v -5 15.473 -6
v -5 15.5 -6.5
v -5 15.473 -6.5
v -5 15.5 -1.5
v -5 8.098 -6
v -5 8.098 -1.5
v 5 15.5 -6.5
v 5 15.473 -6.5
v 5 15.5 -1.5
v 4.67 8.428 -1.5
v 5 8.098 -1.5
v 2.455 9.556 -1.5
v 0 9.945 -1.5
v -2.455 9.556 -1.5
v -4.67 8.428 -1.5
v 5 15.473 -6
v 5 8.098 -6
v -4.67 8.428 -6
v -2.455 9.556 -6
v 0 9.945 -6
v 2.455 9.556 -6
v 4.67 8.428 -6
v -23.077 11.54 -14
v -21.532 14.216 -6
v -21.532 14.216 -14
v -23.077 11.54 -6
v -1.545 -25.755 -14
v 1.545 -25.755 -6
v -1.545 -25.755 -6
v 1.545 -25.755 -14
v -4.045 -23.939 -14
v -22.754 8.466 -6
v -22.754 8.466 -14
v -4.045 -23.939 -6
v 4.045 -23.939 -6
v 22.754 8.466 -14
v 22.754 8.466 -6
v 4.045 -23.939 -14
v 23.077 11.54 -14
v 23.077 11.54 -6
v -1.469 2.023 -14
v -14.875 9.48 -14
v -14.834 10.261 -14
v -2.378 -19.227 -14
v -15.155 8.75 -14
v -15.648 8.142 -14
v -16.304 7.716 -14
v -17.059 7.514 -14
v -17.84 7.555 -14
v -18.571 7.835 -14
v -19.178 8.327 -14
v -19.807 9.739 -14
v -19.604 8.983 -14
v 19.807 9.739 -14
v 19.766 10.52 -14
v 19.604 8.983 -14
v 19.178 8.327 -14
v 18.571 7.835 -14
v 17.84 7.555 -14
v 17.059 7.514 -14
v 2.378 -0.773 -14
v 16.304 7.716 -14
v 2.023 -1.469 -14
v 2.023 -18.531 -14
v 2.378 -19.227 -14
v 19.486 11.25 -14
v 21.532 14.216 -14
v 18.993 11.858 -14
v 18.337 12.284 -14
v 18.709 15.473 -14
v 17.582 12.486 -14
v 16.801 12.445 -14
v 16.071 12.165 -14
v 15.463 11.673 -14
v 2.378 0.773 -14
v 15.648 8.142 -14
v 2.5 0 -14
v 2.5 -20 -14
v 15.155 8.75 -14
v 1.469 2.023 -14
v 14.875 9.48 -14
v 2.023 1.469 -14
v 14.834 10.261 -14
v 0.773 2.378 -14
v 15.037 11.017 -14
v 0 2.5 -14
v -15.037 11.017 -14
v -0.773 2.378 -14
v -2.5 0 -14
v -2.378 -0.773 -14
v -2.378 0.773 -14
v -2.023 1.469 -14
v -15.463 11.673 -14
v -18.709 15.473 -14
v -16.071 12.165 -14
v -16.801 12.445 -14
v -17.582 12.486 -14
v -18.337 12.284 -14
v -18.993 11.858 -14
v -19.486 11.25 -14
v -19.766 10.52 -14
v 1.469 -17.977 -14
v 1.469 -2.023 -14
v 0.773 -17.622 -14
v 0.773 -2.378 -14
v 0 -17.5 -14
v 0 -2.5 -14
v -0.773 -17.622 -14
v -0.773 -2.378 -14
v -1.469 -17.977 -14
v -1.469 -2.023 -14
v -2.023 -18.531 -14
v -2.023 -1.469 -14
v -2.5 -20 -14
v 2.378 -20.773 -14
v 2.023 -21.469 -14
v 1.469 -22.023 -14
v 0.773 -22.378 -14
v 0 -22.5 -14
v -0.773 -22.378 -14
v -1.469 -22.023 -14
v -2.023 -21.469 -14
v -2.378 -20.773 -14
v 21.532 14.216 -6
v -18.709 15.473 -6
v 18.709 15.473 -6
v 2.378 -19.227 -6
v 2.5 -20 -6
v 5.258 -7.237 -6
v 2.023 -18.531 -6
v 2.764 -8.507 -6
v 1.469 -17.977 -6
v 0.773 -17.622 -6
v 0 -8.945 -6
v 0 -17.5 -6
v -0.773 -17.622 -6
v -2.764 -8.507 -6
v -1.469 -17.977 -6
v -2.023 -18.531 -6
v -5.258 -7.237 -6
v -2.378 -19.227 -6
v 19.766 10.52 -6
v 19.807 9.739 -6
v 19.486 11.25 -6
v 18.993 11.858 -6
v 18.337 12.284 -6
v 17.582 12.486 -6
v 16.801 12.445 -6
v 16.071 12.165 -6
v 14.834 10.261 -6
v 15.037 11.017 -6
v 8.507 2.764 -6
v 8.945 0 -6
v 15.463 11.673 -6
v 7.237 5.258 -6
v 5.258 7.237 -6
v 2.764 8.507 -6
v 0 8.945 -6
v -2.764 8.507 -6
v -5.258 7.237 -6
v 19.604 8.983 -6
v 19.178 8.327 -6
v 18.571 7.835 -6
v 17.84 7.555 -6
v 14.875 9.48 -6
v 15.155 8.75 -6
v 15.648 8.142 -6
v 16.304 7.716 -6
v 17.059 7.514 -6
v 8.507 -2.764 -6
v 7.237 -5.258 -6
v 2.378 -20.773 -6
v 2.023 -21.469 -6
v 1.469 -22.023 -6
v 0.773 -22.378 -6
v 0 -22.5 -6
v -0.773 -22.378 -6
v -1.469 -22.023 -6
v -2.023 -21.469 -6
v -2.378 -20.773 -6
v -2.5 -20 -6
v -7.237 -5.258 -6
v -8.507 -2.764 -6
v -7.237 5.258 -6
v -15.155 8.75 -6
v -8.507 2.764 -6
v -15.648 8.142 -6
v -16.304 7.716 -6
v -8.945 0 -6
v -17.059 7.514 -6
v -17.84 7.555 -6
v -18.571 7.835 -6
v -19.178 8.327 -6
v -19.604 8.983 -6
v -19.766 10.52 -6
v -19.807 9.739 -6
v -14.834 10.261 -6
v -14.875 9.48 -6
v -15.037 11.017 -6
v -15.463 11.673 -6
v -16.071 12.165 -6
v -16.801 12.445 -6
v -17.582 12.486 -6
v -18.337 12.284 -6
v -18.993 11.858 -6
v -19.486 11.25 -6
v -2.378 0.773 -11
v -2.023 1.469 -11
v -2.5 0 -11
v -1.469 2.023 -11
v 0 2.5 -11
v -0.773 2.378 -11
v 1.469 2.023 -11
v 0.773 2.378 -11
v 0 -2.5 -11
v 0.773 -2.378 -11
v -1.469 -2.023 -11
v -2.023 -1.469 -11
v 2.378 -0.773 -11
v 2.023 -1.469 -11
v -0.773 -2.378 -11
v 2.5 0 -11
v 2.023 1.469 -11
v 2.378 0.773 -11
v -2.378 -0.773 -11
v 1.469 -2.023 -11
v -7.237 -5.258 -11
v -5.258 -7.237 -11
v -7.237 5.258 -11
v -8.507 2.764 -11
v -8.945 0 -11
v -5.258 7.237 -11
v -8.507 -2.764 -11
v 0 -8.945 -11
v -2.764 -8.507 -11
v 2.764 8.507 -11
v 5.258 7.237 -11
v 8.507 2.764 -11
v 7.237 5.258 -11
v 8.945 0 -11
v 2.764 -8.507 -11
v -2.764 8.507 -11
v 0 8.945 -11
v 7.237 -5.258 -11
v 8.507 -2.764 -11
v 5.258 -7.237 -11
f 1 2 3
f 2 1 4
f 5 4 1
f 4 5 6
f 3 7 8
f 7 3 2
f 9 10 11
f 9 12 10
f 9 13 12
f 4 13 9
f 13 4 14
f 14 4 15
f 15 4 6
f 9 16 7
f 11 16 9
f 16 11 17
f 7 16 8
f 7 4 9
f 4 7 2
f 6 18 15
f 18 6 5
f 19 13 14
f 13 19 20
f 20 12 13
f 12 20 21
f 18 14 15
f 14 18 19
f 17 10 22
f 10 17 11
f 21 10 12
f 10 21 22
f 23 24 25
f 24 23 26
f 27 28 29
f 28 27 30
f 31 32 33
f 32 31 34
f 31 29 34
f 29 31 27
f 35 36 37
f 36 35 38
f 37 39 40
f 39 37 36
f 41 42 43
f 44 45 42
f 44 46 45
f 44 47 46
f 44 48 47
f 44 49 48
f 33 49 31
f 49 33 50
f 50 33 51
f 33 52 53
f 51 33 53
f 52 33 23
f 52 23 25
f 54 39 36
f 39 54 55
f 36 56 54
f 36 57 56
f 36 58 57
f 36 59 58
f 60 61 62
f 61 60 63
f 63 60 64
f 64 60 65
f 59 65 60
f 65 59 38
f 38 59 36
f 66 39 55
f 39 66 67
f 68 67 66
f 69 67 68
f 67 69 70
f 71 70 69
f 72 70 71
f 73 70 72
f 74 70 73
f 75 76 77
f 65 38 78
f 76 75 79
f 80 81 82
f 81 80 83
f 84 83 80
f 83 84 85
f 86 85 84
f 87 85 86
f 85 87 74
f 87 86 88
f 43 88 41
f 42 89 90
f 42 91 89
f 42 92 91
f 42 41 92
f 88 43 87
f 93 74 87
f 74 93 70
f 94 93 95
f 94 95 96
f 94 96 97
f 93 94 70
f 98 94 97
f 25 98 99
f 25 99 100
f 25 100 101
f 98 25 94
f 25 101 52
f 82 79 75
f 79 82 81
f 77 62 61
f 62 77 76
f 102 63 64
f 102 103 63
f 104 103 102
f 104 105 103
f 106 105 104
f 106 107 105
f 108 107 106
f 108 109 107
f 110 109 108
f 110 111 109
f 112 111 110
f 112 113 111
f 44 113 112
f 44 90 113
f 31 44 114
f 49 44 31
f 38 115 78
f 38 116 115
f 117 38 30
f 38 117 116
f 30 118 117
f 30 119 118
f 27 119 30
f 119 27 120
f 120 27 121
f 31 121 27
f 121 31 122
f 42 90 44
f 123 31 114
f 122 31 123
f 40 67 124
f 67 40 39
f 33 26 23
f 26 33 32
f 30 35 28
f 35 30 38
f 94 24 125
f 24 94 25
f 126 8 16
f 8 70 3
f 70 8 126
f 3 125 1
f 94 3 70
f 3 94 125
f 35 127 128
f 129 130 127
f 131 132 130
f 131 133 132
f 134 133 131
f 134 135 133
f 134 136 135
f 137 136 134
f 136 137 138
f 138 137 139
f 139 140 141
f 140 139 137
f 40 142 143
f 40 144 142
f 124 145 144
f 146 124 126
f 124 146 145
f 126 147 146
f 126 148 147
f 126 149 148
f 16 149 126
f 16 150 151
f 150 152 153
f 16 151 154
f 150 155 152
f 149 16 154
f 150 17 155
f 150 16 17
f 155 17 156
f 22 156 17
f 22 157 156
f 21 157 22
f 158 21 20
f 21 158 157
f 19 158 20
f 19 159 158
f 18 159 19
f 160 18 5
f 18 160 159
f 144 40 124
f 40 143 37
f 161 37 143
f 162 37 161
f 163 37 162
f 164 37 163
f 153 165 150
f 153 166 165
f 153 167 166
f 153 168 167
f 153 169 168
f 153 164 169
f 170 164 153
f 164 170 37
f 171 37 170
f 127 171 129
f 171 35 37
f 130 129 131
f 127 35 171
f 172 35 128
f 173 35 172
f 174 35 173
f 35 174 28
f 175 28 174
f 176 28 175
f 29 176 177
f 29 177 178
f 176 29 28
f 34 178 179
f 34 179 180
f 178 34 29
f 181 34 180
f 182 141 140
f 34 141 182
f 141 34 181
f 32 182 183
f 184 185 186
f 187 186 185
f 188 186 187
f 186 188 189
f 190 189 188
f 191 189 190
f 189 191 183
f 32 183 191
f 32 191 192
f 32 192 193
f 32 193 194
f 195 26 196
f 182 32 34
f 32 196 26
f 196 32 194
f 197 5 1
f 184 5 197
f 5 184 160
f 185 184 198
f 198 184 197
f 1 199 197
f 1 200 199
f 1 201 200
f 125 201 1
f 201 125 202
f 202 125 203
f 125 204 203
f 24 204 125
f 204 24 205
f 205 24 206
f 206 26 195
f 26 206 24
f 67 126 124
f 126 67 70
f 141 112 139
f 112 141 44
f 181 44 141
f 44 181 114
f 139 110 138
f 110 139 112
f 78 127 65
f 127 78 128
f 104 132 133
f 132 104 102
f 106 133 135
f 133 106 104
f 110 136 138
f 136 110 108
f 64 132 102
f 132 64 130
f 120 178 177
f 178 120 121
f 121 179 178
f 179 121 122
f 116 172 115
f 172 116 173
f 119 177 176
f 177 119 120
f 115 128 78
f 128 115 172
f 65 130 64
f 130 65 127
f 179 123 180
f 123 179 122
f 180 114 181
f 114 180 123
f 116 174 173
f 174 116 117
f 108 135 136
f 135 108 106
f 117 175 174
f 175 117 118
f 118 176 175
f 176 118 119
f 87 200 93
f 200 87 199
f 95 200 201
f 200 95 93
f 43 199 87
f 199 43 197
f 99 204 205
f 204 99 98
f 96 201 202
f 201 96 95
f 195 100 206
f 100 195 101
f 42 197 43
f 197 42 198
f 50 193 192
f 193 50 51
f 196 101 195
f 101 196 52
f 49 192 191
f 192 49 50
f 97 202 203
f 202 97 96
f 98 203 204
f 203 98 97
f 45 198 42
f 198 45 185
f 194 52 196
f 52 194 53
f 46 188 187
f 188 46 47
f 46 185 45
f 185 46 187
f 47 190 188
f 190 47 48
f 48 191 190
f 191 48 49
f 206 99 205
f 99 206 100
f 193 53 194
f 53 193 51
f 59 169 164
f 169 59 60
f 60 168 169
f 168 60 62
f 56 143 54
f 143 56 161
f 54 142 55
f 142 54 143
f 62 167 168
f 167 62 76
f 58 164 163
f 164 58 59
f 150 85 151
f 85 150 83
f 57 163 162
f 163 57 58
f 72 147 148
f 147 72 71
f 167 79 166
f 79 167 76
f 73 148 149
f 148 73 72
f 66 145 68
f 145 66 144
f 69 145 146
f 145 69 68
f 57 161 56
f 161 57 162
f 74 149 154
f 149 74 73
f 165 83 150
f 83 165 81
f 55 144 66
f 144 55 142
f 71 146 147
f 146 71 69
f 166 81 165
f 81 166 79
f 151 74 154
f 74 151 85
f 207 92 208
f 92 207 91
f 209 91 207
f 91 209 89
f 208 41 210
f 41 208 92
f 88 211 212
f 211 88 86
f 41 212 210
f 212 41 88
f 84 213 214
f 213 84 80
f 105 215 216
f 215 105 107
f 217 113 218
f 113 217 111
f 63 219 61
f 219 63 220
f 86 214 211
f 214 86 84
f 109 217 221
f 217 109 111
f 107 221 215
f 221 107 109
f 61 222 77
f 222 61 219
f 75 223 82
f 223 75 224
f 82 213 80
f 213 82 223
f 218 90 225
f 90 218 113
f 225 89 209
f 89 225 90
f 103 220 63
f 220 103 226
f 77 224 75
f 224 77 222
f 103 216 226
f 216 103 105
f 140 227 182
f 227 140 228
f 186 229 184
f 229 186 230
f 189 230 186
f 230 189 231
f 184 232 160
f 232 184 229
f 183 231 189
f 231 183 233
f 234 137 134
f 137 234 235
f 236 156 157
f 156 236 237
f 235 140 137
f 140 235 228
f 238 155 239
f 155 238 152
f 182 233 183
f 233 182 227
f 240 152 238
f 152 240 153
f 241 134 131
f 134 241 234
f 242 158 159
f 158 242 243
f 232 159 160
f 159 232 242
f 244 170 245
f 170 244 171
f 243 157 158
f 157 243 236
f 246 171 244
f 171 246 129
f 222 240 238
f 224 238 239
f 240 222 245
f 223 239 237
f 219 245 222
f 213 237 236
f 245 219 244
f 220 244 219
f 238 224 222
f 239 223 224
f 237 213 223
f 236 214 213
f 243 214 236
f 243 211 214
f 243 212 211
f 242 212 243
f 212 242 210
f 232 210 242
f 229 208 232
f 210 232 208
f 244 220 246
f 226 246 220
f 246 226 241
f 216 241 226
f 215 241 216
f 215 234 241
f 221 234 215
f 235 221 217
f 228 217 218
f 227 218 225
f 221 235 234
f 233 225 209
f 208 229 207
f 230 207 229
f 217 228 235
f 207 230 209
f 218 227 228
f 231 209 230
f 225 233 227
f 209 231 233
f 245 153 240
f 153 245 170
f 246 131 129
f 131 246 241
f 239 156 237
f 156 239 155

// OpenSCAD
// file: jaws.scad
include<configuration.scad>;

thickness = 6;
gap = 10;

h = (thickness+gap)/2;
r = h/2 / cos(30);




module jaws() {
  difference() {
    union() {
      intersection () {
        rotate([90, 0, 0]) cylinder(r=5, h=gap+thickness, center=true, $fn=24);
        translate([-4, 0, 0]) cube([10, gap+thickness, h], center=true);
      }
      intersection() {
        translate([10, 0, 0]) cube([26, gap+thickness, h], center=true);
        translate([10, 0, 0]) rotate([0, 90, 0]) rotate([0, 0, 30]) cylinder(r1=gap, r2=r, h=26, center=true, $fn=6);
      }
	
    }
	
	//Makin it look nice
    translate([-1.5, 0, 0]) cube([10, gap, 10], center=true);
    translate([3.5, 0, 0]) rotate([0, 0, 30]) cylinder(r=gap/2, h=10, center=true, $fn=6);
    translate([4, 0, 4]) rotate([0, 45, 0]) rotate([0, 0, 30]) cylinder(r=4.2, h=8, center=true, $fn=6);
    translate([4, 0, -4]) rotate([0, -45, 0]) rotate([0, 0, 30]) cylinder(r=4.2, h=8, center=true, $fn=6);

	//M3 Holes
    rotate([90, 0, 0]) cylinder(r=M3h/2, h=40, center=true, $fn=12);



  }
}

module jaws_full(){
translate([-50, 0, 0]) jaws();
translate([50,0,0]) mirror([1,0,0]) jaws();
translate([0, 0, 0]) rotate([90, 0, 90]) cylinder(r=r, h=80, center=true, $fn=6);
}
jaws_full();
// file: idler_end.scad
include<configuration.scad>;
use<modules.scad>;
use<platform.scad>;


//VARIABLE
side_length = pole_center*0.866025;
side_width = 20;
idler_height = 16;

switch_hole_sep = 9.5;



//Testers
$fn=50;
draw_all = 0; //




//Modules
module nema17(){

	cube([42,47.5,42],center=true);
	translate([0,47.5/2+25/2,0]) rotate([90,0,0]) cylinder(r=2.5,h=25,center=true);
	translate([0,47.5/2+25/2+4,0]) rotate([90,0,0]) cylinder(r=10,h=25,center=true); //The pulley
}


module m8poles(){

	for(i=[-1,1,1]){
		translate([i*rod_sep,0,0]) cylinder(r=M8/2,h=rod_height,center=true);

	}
}

module idler_end(){
	union(){
		difference(){
			union(){ //Getting the basic shape
				for(i=[-1:2:1]){
					rotate([0,0,i*30]) translate([i*(30-side_width/2),-side_length/2-19,0]) side_mount(i);
					translate([i*rod_sep,0,0]) rotate([0,0,0]) cylinder(r=M8/2+2.5,h=idler_height,center=true);
					translate([i*(rod_sep-4),-8,0]) rotate([0,0,0]) cylinder(r=8,h=idler_height,center=true);
					translate([0,-15,0]) cube([50,6,idler_height],center=true);


					translate([-18,-28,0]) cube([4,20,idler_height],center=true);
					translate([-28,-28,-5.5]) cube([20,20,5],center=true);
				}
			}

		translate([0,0,rod_height/2+42/2-21]) m8poles();
		rotate([90,0,0]) cylinder(r=M8h/2,h=50,center=true);
		//%rotate([90,0,0]) cylinder(r=17.3/2,h=50,center=true);

		


		for(i=[-1:2:1]){
			translate([i*(rod_sep-13),-5,0]) rotate([0,0,0]) cylinder(r=8,h=idler_height+1,center=true);
			translate([i*40,-36,0]) rotate([0,0,0]) cylinder(r=M3/2,h=idler_height+1,center=true);

			translate([-15,i*(switch_hole_sep/2)-30,3]) rotate([0,90,0]) cylinder(r=M3h/2,h=20,center=true);
		}
		

		}
		//difference(){
			
			//Idler Bar
		//	translate([0,-15,0]) cube([50,6,idler_height],center=true);
	
		//	rotate([90,0,0]) cylinder(r=M8h/2,h=50,center=true);
		//}
		

	}
	//%translate([0,0,rod_height/2+42/2]) m8poles();

}


module motor_holes(){
	for(i=[-1,1,1]){
		translate([0,0,i*31/2]) for(i=[-1,1,1]){
			translate([i*32/2,0,0]) rotate([90,0,0]) cylinder(r=M3h/2,h=20,center=true);
			translate([i*32/2,0,0]) rotate([90,0,0]) cylinder(r=M3h/2,h=10,center=true);
		}
	}
}

module side_mount(a){

	difference(){
		cube([side_width,side_length,idler_height],center=true);

		translate([-5*a,-2,5]) cube([side_width,side_length-16,idler_height],center=true);

		for(i=[-1,1,1]){
			translate([0,-30,2]) rotate([90,0,0]) cylinder(r=M4h/2,h= 40,center=true);

			translate([0,0,2]) rotate([0,90,0]) cylinder(r=4,h= 40,center=true,$fn=4);


			//translate([0,-23,idler_height/2]) cylinder(r=M3/2,h= 10,center=true);
			//translate([-2.5,-26.5,idler_height/2-7]) cube([5,11,3]);

		}
	}

}


 
/************************DRAWING************************/

if (draw_all == 1){

	for(i=[0:120:270]){

		rotate([0,0,i]) translate([0,80.6,0]) idler_end();
		//%translate([0,0,100]) cylinder(r=50,h=100,center=true);

	}
}
if(draw_all == 0){
	idler_end();
}



//side_mount();


//motor_holes();
//rotate([0,0,-30]) translate([0,0,100]) platform();
// file: modules.scad
module hollow_cylinder(r1,r2,h,cent,fn){
	difference(){
		cylinder(r=r1,h=h,center=cent,$fn=fn);
		cylinder(r=r2,h=h+.1,center=cent,$fn=fn);
	}
}
// file: carriage.scad
include<configuration.scad>;
use<modules.scad>;
use<idler_end.scad>;
use<jaws.scad>;

//VARIABLES

lm8uu_r = 15.5/2;  //Gotta check this
lm8uu_h = 24.12;
height = 15;
thick = 5;



ten_pos = 5.4;  //Position of tensioner in x-axis
pos_tem = 2; //temporary variable



cubex = 6;
cubey = 15;
cubez = 10;
cubie = [cubex,cubey,cubez];

arm_sep = 21;
swivel_sep = 13+cubex;



//MODULES
module m8poles(){
	for(i=[-1:2:1]){
		translate([i*rod_sep,0,0]) cylinder(r=M8/2,h=rod_height,center=true);
	}
}
module lm8uu(h){
	for(i=[-1:2:1]){
		translate([i*rod_sep,0,0]) cylinder(r=lm8uu_r,h=h,center=true);

	}
}




module carriage(){
	difference(){
		union(){
			
			//The main section
			translate([0,5,-lm8uu_h/2+height/2]) cube([rod_sep*2,thick,height],center=true);


			//Tensioner Block
			translate([ten_pos,0,-lm8uu_h/2+height/2+1.5]) cube([10,5,height+3],center=true);

			//Connectors
			translate([0,cubey,-lm8uu_h/2+height/2-10/4]) connector(1);

			//Endstop button?
			//translate([arm_sep-swivel_sep/2,cubey*1.7,-lm8uu_h/2+height/2-10/4]) difference(){
			///	cube([cubex,cubey*.9,cubez],center=true);
			//	translate([0,-cubey/5-1,0]) rotate([0,90,0]) cylinder(r=cubez/2,h=cubex+1,center=true);
			//}
			

			for(i=[-1:2:1]){
				
				//The slots for the lm8uu
				translate([i*rod_sep,0,0]) difference(){
					cylinder(r=lm8uu_r+2,h=lm8uu_h,center=true);
					translate([0,-5,0]) cube([lm8uu_r*2+8,10,lm8uu_h+1],center=true);
				}

				//In order to get the material for the zip-tie holes
				translate([i*(rod_sep-9),5,4]) rotate([90,0,0]) cylinder(r=8,h=thick,center=true);
			}
		}

	
		//LM8UU Slot fit
		lm8uu(lm8uu_h+1);

		//Cutting away for the rounded effect
		for(i=[-1:2:1]){
			translate([i*(rod_sep-20),5,5/2+9]) rotate([90,0,0]) cylinder(r=8,h=thick+.1,center=true);
		}

		//Holes for zip-ties
		for(i=[-1:2:1],d=[-1:2:1]){
			translate([i*rod_sep,0,d*(24.12/2-4)]) rings();
		}

		//Tensioner Holes
		translate([ten_pos,0,-lm8uu_h/2+height/2]){
			translate([0,0,8]) cube([2,2,6],center=true); //spectra hole

			translate([0,-1,pos_tem]) rotate([90,0,0]) cylinder(r=M3washer/2, h=4, center=true);
			translate([0,-1,pos_tem]) rotate([90,0,0]) cylinder(r=M3h/2, h=20, center=true);
			translate([0,7,pos_tem]) rotate([90,90,0]) cylinder(r=M3nut/2, h=4, center=true, $fn=6);
		
			translate([0,0,-5]) cube([2,20,2],center=true); //top spectra hole
		}
		
		//endstop button holes
		translate([arm_sep-swivel_sep/2,cubey+2,-5]) cylinder(r=3.4/2,h=20,center=true);


	}
}

module rings(){
	difference(){
		cylinder(r=lm8uu_r+4,h=3,center=true);
		cylinder(r=lm8uu_r+2,h=4,center=true);
	}
}



module connector(sup){
	difference(){
		union(){
				
			//The initial blocks
			for(i=[-1:2:1],d=[-1:2:1]){
				translate([d*swivel_sep/2+i*arm_sep,0,0]){
					cube(cubie,center=true);
					translate([0,cubey/2,0]) rotate([0,90,0]) cylinder(r=cubez/2,h=cubex,center=true);

					if(sup == 1){
					//get that extra support
						difference(){
							translate([0,-cubey/2,cubez/2]) rotate([0,90,0]) cylinder(r=cubez/2,h=cubex,center=true);
							translate([0,-cubey/9+1,cubez+1]) rotate([0,90,0]) cylinder(r=cubez/1.6,h=cubex+1,center=true);
						}
					}
				}
			}
		}
		
		//M3 holes
		translate([0,cubey/2]) rotate([0,90,0]) cylinder(r=M3h/2,h=100,center=true);
		
		//Nut holes
		for(i=[-1:2:1],d=[-1:2:1]){

			translate([arm_sep*i+swivel_sep/2*d-2*d,cubey/2,0]) rotate([90,0,90]) cylinder(r=M3nut/2,h=3,center=true,$fn=6);
		}
		
	}	
}





//DRAW
carriage();
%translate([20,18,-5]) rotate([90,90,90]) jaws();

//%translate([0,0,-100]) rotate([0,0,180]) idler_end();
%m8poles();
%lm8uu(lm8uu_h);
// file: hotend_clamp.scad
include<configuration.scad>;

$fn=60;
clamp_h = 2.31;
ubis_gap = 11.8;


module clamp(){
	difference(){
		union(){
			for(i=[0:120:240]){
				hull(){
					rotate([0,0,i]) translate([0,-35,0]) cylinder(r=6,h=clamp_h,center=true);
					cylinder(r=6,h=clamp_h,center=true);
				}
			}
			cylinder(r=ubis_gap/2+5,h=clamp_h,center=true);
		}


		for(i=[0:120:240]){
			rotate([0,0,i]) translate([32,0,0]) cylinder(r=M4/2,h=clamp_h+1,center=true);
		}
		
		cylinder(r=ubis_gap/2,h=clamp_h+1,center=true);
		hull(){
			cylinder(r=ubis_gap/2-1,h=clamp_h+1,center=true);
			translate([-30,0,0]) cylinder(r=ubis_gap/2-1,h=clamp_h+1,center=true);
		}

	}
}



module Head_Mount(){

	difference(){
		union(){
			hull(){
				for(a = [0:120:240]){
					rotate([0,0,a]) translate([0,-21,0]) cylinder( r=5, h=clamp_h,center=true);
				}
			}
		}

		//Bolt holes
		for(a = [0:120:240]){
			rotate([0,0,a]) translate([0,-20,0]) cylinder( r=M4/2, h=clamp_h+1,center=true);
		}
	
		//Hotend hole w/ pathway thing
		cylinder(r=ubis_gap/2,h=clamp_h+1,center=true);
		hull(){
			cylinder(r=ubis_gap/2,h=clamp_h+1,center=true);
			translate([0,50,0]) cube([2*ubis_gap,1,clamp_h+1],center=true);

		}

	}
}




//DRAWING

//clamp();
Head_Mount();
// file: platform.scad
include<configuration.scad>;
use<hotend_clamp.scad>;
use<carriage.scad>;
$fn=20;

plat_h = 10;
arm_sep = 21;


module ubis(){
	ubis_l = 70-2.31-4.3;

	translate([0,0,ubis_l+5/2+2.31+4.3/2]) cylinder(r=15.89/2,h=4.3,center=true);
	translate([0,0,ubis_l+5/2+2.31/2]) cylinder(r=11.6/2,h=2.31,center=true);
	translate([0,0,ubis_l/2+5/2]) cylinder(r=15.89/2,h=ubis_l,center=true);
	cylinder(r2=15.89/2,r1=3,h=5,center=true);
}




module platform(){

	difference(){
		union(){
			hull() for(i=[0:120:240]){
				rotate([0,0,i]) translate([0,-15,0]) cube([10,arm_sep+20,plat_h],center=true);
			}
			for(i=[0:120:240]){
				rotate([0,0,i]) translate([0,25,0]) connector();
			}
		}
	
		translate([0,0,10]) cube([100,100,10],center=true);
		
		
		hull() for(i=[0:120:240]){
			rotate([0,0,i]) translate([0,-18,0]) cylinder(r=5,h=plat_h+1,center=true);
		}
		for(i=[0:120:240]){
			rotate([0,0,i]) translate([0,18,0]) cylinder(r=M4/2,h=plat_h+1,center=true);
			rotate([0,0,i]) translate([0,-30,0]) cylinder(r=M4/2,h=plat_h+1,center=true);
			//rotate([0,0,i]) translate([11.5,18.5,0]) cylinder(r=M4/2,h=plat_h+1,center=true);
			//rotate([0,0,i]) translate([-11.5,18.5,0]) cylinder(r=M4/2,h=plat_h+1,center=true);


			
		}	
		
		
	}
	

}





/********DRAWING********/

translate([0,0,-20]) ubis();
platform();

%translate([0,0,20]) rotate([0,0,0]) Head_Mount();
// file: configuration.scad
//Configuration File
//Lets you adjust pretty much everything
//
//Makes it all super paramatric
//


//Configuration Block
$fn = 20;
module configBlock(){
	difference(){
		cube([15,30,10],center=true);

		union(){  //Vertical Holes
			translate([0,10,5]) rotate([0,0,0]) cylinder(r=M3/2,h=10,center=true);
			translate([0,3,5]) rotate([0,0,0]) cylinder(r=M4/2,h=10,center=true);
			translate([0,-8,5]) rotate([0,0,0]) cylinder(r=M8/2,h=10,center=true);
		}

		union(){  //Horizontal Holes
			translate([-8,10,0]) rotate([0,90,0]) cylinder(r=M3h/2,h=10,center=true);		
			translate([-8,3,0]) rotate([0,90,0]) cylinder(r=M4h/2,h=10,center=true);
			translate([-10,-6,0]) rotate([0,90,0]) cylinder(r=M3nut/2,h=10,center=true,$fn=6);

			translate([10,3,0]) rotate([0,90,0]) cylinder(r=M3washer/2,h=10,center=true);


			//translate([0,-8,0]) rotate([0,90,0]) cylinder(r=M8/2,h=10,center=true);
		}
	}
}

//configBlock();

//Bolts
M3 = 4;
M4 = 5;
M8 = 9;

M3h = 3.6;  //Horizontal versions
M4h = 5;  //Horizontal versions
M8h = 8; //Horizontal versions

//Nuts & Washers

M3washer = 7.4;
M3nut = 7.1;

//Size of other parts
rod = 8;  //Dimension of smooth rod
lm8uu = 16;

/*************************
 Printer Design files now
**************************/

//basic
arm_length = 100 ; //Length of the arms based on a planned 100x100 print size
pole_center = 60 ; //The pole distance from the center of the print
rod_sep = 25 + rod/2; // pole to pole seperation for one set. Includes rod length
rod_height = 260;

//motor end effector


//Universal joints
//holewidth = 6;
//arm_sep = 40;



//Hotend
// main file
include<configuration.scad>;
use<platform.scad>;
use<hotend_clamp.scad>;

height = 8;

//MODULES
module bowden(){
	difference(){
		union(){
			hull() for(i=[0:120:240]){
				rotate([0,0,i]) translate([0,-21,0]) cylinder(r=5,h=height,center=true,$fn=10);
			}
			translate([0,8,-6]) difference(){
				cube([10,15,5],center=true);
				translate([0,-6,0]) cylinder(r=15.89/2,h=10,center=true);
			}
		}
		for(i=[0:120:240]){
			rotate([0,0,i]) translate([0,-20,0]) cylinder(r=M4/2,h=height+4, center=true);
		}
		cylinder(r=M4/2,h=50,center=true);
		translate([0,0,-2]) cylinder(r=15.89/2+1,h=6,center=true);
	}
}





//DRAWING
/*
%translate([0,0,-70])ubis();
%translate([0,0,-3]) Head_Mount();
#cylinder(r=4/2,h=40,center=true);
*/
rotate([0,180,0]) translate([0,0,10]) bowden();
